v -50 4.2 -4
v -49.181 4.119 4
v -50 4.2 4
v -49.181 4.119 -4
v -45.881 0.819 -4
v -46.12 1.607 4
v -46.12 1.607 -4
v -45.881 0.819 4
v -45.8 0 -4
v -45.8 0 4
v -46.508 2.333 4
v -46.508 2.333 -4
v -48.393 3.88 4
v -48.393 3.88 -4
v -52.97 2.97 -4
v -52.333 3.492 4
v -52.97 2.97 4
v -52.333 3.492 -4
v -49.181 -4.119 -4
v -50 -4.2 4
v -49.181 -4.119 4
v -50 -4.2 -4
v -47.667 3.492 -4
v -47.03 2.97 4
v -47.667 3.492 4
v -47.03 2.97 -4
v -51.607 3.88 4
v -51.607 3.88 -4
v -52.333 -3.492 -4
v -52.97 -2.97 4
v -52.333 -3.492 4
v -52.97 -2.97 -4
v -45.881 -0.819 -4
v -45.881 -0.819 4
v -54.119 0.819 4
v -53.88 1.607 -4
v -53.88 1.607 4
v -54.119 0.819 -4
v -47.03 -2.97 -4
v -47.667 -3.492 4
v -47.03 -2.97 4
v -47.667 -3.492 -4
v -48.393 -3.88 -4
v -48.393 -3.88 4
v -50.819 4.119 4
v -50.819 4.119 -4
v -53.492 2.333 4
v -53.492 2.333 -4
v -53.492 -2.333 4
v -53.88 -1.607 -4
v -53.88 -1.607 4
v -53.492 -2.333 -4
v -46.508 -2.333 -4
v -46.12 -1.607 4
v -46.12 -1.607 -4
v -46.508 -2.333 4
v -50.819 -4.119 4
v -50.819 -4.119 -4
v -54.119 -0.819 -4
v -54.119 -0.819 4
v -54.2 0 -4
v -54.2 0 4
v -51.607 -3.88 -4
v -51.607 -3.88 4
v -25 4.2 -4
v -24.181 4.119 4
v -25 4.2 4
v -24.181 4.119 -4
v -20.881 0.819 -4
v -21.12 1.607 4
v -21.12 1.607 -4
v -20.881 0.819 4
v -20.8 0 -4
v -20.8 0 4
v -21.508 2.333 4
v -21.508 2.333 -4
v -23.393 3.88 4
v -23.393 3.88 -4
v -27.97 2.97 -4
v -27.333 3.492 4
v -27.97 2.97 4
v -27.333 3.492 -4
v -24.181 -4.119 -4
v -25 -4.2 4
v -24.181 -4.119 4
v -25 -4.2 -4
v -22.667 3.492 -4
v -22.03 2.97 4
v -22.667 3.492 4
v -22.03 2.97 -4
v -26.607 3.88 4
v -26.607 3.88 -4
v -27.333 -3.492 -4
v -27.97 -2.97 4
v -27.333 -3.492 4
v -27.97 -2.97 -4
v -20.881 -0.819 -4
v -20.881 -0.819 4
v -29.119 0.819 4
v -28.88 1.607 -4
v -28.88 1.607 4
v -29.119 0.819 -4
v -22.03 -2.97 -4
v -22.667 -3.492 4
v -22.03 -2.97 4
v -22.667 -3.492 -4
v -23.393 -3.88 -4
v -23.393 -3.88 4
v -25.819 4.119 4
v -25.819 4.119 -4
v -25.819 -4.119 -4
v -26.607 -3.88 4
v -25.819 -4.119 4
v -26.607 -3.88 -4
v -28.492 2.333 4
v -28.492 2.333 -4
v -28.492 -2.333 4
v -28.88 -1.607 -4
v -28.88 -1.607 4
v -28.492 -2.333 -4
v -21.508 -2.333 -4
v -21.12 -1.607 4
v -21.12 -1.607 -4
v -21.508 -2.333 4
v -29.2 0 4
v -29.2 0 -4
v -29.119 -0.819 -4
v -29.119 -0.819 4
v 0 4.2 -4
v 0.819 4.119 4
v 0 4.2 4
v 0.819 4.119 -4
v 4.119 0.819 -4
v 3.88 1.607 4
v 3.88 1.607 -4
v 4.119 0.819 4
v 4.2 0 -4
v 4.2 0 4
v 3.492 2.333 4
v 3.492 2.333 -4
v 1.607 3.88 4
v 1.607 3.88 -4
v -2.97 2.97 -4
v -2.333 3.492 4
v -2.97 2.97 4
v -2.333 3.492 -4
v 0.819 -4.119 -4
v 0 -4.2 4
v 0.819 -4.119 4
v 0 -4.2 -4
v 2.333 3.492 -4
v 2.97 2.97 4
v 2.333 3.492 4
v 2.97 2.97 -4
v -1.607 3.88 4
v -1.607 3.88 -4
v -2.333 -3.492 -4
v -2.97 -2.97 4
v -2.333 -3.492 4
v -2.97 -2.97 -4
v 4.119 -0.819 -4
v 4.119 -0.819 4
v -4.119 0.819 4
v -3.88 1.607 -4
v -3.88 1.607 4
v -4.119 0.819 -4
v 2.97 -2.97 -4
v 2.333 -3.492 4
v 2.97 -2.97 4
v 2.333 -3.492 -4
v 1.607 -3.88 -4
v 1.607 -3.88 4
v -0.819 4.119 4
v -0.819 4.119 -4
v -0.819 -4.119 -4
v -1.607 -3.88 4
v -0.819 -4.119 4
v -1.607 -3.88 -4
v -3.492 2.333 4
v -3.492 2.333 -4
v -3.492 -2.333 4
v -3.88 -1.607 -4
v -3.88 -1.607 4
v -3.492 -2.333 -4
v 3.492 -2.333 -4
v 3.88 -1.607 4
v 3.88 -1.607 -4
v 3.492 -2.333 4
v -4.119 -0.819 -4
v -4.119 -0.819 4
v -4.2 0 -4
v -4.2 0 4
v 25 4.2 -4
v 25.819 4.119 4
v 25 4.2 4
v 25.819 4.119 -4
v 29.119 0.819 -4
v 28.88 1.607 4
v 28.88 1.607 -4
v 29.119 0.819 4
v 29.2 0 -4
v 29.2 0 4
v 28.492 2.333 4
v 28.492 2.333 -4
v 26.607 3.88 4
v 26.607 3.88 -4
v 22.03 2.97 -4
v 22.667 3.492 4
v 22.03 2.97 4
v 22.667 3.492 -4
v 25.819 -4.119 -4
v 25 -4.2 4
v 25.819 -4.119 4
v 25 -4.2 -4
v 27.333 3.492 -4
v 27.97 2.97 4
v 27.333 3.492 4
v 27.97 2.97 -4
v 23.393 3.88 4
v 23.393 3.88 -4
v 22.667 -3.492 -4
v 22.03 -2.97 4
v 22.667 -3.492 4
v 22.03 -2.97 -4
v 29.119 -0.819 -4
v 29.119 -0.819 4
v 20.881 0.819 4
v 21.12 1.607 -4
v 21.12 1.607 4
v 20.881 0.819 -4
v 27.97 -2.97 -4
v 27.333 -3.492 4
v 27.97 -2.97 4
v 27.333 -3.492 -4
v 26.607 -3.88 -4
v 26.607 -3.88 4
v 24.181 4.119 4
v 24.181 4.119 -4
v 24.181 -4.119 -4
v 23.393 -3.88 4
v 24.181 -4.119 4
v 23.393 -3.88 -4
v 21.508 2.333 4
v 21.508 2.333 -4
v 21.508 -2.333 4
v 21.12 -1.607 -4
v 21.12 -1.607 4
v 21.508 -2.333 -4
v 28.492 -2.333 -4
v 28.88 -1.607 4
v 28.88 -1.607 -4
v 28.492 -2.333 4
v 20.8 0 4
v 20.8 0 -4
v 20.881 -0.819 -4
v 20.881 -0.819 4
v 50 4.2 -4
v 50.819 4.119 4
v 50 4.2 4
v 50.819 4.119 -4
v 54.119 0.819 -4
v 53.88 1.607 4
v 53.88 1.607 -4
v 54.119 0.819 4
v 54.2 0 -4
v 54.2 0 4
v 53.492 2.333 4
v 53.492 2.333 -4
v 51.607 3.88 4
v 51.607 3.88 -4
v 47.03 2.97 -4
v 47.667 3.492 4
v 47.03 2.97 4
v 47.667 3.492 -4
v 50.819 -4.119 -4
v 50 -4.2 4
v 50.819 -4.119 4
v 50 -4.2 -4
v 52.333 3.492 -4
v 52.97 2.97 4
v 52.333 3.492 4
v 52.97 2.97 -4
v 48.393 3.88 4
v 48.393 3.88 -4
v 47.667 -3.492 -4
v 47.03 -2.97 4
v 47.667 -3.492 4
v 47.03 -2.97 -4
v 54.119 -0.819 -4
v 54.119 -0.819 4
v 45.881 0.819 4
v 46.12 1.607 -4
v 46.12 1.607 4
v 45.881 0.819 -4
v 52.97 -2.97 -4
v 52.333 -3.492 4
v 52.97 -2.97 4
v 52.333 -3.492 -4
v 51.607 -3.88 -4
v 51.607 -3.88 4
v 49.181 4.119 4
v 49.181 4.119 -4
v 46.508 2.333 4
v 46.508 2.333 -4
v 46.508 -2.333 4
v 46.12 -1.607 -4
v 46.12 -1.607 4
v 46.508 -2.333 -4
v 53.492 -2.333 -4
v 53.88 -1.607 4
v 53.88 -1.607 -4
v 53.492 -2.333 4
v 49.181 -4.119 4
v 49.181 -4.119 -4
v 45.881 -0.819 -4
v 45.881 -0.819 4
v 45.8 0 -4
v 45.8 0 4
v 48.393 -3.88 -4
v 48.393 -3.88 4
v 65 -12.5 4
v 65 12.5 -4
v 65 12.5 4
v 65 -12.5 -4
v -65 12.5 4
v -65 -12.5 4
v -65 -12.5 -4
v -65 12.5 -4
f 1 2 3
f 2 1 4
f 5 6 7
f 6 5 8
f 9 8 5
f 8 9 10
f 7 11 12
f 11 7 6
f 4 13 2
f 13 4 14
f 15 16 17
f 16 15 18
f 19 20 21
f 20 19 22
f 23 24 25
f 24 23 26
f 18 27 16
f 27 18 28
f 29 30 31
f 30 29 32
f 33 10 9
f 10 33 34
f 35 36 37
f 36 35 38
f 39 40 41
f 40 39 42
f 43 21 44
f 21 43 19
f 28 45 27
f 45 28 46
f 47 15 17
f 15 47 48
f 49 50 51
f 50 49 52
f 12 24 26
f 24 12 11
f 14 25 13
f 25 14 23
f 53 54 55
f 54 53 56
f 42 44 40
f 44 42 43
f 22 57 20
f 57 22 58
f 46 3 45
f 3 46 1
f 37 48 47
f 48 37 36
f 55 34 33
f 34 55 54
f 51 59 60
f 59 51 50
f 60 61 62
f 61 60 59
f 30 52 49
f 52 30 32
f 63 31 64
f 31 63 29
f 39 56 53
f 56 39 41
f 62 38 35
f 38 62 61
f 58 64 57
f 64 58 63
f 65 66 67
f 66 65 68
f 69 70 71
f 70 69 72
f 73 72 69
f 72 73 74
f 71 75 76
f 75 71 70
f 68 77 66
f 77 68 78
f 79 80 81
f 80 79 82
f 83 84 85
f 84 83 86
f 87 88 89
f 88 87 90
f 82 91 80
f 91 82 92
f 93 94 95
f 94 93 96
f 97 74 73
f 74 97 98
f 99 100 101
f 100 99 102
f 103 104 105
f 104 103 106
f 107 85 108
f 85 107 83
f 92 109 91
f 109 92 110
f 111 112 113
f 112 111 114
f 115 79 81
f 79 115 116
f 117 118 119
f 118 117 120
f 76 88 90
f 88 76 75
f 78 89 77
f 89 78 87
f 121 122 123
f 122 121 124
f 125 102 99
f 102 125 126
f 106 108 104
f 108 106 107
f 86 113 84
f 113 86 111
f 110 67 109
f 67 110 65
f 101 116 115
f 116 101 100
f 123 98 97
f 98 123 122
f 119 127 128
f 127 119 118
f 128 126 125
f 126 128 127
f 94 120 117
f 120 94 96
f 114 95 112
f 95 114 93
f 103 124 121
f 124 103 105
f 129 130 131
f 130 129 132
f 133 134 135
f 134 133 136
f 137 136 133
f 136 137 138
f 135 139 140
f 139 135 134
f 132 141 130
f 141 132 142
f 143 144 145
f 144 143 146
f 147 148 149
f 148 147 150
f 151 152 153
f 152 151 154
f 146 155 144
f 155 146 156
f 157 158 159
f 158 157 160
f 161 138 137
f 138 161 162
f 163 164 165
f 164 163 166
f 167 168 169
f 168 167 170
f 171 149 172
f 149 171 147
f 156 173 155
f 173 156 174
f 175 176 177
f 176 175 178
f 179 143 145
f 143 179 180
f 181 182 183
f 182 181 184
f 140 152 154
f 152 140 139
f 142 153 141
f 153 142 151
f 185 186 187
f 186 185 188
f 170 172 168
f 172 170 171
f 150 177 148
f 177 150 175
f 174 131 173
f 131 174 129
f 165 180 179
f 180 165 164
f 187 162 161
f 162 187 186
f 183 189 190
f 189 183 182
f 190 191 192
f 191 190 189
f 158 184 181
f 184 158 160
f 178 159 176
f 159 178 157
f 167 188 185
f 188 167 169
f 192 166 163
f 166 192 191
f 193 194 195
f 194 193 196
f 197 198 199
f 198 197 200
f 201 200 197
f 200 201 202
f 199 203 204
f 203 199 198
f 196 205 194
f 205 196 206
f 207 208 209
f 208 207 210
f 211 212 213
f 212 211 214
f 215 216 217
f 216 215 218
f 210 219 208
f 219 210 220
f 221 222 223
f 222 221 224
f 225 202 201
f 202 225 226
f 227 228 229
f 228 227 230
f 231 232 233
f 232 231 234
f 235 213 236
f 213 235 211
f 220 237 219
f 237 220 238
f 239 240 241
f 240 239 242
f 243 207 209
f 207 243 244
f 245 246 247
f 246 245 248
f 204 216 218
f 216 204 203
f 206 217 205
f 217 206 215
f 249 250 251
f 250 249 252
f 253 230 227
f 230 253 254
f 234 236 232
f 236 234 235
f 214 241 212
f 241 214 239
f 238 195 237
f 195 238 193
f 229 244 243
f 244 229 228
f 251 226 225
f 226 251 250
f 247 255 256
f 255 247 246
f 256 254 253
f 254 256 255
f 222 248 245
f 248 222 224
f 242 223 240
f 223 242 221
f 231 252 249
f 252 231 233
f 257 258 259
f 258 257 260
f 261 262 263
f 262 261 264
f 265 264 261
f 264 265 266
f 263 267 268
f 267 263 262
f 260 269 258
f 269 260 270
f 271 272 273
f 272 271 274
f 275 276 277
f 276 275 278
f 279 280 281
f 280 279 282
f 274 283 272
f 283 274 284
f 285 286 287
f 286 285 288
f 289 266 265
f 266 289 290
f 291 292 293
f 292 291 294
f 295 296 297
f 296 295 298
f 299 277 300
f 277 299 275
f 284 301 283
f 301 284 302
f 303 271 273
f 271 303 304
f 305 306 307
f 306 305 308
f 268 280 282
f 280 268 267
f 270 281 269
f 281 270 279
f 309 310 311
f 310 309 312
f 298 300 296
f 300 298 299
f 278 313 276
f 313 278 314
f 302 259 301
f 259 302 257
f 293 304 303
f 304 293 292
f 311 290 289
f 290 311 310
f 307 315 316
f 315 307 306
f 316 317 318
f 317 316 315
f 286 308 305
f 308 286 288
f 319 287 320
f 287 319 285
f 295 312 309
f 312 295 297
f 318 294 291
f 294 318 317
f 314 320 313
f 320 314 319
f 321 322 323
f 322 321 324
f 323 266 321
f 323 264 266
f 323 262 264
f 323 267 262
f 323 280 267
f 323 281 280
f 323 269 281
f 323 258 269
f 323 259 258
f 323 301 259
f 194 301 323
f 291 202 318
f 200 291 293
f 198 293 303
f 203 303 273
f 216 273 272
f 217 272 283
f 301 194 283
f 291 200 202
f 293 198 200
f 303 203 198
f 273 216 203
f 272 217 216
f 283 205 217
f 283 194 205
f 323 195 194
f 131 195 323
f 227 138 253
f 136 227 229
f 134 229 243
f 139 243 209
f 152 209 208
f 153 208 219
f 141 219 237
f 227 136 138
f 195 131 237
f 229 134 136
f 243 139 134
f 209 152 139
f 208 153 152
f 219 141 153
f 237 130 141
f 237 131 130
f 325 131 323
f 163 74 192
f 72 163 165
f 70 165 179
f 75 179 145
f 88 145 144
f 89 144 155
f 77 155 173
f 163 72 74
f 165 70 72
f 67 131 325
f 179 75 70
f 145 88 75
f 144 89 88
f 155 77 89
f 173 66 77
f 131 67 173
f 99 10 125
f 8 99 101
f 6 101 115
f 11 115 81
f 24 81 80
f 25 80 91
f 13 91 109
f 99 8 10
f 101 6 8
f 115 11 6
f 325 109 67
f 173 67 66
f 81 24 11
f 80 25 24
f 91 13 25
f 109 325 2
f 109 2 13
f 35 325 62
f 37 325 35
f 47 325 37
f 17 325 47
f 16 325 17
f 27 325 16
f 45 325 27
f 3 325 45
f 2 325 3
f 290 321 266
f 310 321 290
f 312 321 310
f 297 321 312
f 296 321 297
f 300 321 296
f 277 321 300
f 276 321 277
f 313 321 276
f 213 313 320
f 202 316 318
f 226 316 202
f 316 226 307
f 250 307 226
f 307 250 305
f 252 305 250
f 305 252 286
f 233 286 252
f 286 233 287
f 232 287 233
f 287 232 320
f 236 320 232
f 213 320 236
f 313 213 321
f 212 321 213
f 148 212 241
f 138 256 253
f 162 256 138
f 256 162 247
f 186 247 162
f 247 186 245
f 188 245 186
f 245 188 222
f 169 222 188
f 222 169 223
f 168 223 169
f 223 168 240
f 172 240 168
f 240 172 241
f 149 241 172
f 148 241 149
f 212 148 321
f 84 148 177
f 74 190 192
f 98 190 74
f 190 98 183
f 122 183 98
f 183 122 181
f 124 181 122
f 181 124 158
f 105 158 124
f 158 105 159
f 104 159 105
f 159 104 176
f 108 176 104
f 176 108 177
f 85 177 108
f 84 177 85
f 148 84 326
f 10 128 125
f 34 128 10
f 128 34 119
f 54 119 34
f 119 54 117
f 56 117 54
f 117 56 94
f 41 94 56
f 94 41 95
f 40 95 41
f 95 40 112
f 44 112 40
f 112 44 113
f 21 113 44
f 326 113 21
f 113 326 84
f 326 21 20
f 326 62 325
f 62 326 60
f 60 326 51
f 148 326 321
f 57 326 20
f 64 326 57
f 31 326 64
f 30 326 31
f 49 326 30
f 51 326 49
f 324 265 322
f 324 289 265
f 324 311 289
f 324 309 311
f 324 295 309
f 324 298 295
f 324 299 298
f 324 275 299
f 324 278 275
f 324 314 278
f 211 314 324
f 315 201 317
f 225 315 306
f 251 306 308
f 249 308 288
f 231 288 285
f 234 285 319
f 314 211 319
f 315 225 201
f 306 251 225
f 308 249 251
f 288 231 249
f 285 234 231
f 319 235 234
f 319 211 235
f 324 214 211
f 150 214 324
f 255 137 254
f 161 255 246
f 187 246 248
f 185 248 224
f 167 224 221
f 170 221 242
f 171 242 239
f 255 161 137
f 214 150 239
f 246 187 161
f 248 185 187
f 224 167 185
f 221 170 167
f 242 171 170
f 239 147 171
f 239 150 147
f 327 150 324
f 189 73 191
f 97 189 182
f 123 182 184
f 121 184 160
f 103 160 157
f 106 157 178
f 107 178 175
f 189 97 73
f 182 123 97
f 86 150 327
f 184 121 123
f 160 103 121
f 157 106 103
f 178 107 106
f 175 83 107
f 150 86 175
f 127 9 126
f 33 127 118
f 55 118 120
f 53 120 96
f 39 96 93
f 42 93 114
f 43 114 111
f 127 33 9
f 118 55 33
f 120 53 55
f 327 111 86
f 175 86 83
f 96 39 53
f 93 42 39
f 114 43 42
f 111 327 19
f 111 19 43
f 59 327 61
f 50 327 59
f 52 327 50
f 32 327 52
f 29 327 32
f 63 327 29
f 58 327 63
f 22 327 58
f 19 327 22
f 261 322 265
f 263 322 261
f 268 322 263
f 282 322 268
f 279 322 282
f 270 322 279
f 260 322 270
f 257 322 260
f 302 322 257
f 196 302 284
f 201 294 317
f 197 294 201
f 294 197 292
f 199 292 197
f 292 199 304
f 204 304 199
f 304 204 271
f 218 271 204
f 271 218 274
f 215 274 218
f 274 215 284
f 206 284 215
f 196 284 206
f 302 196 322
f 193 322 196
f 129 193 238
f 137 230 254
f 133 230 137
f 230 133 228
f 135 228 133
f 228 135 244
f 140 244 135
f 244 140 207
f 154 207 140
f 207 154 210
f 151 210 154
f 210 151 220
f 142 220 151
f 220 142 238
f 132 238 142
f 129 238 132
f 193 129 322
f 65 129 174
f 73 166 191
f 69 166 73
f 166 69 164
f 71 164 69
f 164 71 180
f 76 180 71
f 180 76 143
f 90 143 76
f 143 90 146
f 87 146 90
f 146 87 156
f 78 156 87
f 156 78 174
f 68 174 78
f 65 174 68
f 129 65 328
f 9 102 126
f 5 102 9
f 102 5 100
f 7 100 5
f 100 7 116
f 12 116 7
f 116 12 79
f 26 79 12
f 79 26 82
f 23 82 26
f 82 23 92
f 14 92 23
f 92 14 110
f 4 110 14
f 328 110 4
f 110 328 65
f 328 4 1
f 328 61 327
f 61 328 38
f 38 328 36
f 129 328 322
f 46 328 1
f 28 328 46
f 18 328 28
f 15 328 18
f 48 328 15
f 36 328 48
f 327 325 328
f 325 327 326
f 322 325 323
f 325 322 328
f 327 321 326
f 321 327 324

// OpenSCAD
$fn = 32;

// ----------------------------------------------------------------------
// Hole bar, 5 x Ø8.4
// row layout, 15 mm edge offset
// ----------------------------------------------------------------------

// --- parameters (mm) ---
bar_w = 25;    // bar width (Y)
bar_t = 8;     // bar thickness (Z)
holes = 5;     // holes per row
hole_d = 8.4;  // hole diameter
edge = 15;     // offset from the bar end to the first hole
pitch = 25;    // pitch between neighbouring holes

// --- derived feature positions (mm) ---
span = (holes - 1) * pitch;   // = 100   distance between the end holes
bar_l = span + 2 * edge;      // = 130   overall bar length
start_x = -bar_l / 2 + edge;  // = -50   X of the first hole
feature_centers = [
  [start_x + 0 * pitch, 0],
  [start_x + 1 * pitch, 0],
  [start_x + 2 * pitch, 0],
  [start_x + 3 * pitch, 0],
  [start_x + 4 * pitch, 0]
];   // hole centres of the first row

// bar with one row of holes, drilled from feature_centers
difference() {
  translate([-bar_l / 2, -bar_w / 2, -bar_t / 2]) cube([bar_l, bar_w, bar_t]);
  for (centre = feature_centers)
    translate([centre[0], centre[1], 0])
      cylinder(d = hole_d, h = bar_t + 2, center = true);
}
